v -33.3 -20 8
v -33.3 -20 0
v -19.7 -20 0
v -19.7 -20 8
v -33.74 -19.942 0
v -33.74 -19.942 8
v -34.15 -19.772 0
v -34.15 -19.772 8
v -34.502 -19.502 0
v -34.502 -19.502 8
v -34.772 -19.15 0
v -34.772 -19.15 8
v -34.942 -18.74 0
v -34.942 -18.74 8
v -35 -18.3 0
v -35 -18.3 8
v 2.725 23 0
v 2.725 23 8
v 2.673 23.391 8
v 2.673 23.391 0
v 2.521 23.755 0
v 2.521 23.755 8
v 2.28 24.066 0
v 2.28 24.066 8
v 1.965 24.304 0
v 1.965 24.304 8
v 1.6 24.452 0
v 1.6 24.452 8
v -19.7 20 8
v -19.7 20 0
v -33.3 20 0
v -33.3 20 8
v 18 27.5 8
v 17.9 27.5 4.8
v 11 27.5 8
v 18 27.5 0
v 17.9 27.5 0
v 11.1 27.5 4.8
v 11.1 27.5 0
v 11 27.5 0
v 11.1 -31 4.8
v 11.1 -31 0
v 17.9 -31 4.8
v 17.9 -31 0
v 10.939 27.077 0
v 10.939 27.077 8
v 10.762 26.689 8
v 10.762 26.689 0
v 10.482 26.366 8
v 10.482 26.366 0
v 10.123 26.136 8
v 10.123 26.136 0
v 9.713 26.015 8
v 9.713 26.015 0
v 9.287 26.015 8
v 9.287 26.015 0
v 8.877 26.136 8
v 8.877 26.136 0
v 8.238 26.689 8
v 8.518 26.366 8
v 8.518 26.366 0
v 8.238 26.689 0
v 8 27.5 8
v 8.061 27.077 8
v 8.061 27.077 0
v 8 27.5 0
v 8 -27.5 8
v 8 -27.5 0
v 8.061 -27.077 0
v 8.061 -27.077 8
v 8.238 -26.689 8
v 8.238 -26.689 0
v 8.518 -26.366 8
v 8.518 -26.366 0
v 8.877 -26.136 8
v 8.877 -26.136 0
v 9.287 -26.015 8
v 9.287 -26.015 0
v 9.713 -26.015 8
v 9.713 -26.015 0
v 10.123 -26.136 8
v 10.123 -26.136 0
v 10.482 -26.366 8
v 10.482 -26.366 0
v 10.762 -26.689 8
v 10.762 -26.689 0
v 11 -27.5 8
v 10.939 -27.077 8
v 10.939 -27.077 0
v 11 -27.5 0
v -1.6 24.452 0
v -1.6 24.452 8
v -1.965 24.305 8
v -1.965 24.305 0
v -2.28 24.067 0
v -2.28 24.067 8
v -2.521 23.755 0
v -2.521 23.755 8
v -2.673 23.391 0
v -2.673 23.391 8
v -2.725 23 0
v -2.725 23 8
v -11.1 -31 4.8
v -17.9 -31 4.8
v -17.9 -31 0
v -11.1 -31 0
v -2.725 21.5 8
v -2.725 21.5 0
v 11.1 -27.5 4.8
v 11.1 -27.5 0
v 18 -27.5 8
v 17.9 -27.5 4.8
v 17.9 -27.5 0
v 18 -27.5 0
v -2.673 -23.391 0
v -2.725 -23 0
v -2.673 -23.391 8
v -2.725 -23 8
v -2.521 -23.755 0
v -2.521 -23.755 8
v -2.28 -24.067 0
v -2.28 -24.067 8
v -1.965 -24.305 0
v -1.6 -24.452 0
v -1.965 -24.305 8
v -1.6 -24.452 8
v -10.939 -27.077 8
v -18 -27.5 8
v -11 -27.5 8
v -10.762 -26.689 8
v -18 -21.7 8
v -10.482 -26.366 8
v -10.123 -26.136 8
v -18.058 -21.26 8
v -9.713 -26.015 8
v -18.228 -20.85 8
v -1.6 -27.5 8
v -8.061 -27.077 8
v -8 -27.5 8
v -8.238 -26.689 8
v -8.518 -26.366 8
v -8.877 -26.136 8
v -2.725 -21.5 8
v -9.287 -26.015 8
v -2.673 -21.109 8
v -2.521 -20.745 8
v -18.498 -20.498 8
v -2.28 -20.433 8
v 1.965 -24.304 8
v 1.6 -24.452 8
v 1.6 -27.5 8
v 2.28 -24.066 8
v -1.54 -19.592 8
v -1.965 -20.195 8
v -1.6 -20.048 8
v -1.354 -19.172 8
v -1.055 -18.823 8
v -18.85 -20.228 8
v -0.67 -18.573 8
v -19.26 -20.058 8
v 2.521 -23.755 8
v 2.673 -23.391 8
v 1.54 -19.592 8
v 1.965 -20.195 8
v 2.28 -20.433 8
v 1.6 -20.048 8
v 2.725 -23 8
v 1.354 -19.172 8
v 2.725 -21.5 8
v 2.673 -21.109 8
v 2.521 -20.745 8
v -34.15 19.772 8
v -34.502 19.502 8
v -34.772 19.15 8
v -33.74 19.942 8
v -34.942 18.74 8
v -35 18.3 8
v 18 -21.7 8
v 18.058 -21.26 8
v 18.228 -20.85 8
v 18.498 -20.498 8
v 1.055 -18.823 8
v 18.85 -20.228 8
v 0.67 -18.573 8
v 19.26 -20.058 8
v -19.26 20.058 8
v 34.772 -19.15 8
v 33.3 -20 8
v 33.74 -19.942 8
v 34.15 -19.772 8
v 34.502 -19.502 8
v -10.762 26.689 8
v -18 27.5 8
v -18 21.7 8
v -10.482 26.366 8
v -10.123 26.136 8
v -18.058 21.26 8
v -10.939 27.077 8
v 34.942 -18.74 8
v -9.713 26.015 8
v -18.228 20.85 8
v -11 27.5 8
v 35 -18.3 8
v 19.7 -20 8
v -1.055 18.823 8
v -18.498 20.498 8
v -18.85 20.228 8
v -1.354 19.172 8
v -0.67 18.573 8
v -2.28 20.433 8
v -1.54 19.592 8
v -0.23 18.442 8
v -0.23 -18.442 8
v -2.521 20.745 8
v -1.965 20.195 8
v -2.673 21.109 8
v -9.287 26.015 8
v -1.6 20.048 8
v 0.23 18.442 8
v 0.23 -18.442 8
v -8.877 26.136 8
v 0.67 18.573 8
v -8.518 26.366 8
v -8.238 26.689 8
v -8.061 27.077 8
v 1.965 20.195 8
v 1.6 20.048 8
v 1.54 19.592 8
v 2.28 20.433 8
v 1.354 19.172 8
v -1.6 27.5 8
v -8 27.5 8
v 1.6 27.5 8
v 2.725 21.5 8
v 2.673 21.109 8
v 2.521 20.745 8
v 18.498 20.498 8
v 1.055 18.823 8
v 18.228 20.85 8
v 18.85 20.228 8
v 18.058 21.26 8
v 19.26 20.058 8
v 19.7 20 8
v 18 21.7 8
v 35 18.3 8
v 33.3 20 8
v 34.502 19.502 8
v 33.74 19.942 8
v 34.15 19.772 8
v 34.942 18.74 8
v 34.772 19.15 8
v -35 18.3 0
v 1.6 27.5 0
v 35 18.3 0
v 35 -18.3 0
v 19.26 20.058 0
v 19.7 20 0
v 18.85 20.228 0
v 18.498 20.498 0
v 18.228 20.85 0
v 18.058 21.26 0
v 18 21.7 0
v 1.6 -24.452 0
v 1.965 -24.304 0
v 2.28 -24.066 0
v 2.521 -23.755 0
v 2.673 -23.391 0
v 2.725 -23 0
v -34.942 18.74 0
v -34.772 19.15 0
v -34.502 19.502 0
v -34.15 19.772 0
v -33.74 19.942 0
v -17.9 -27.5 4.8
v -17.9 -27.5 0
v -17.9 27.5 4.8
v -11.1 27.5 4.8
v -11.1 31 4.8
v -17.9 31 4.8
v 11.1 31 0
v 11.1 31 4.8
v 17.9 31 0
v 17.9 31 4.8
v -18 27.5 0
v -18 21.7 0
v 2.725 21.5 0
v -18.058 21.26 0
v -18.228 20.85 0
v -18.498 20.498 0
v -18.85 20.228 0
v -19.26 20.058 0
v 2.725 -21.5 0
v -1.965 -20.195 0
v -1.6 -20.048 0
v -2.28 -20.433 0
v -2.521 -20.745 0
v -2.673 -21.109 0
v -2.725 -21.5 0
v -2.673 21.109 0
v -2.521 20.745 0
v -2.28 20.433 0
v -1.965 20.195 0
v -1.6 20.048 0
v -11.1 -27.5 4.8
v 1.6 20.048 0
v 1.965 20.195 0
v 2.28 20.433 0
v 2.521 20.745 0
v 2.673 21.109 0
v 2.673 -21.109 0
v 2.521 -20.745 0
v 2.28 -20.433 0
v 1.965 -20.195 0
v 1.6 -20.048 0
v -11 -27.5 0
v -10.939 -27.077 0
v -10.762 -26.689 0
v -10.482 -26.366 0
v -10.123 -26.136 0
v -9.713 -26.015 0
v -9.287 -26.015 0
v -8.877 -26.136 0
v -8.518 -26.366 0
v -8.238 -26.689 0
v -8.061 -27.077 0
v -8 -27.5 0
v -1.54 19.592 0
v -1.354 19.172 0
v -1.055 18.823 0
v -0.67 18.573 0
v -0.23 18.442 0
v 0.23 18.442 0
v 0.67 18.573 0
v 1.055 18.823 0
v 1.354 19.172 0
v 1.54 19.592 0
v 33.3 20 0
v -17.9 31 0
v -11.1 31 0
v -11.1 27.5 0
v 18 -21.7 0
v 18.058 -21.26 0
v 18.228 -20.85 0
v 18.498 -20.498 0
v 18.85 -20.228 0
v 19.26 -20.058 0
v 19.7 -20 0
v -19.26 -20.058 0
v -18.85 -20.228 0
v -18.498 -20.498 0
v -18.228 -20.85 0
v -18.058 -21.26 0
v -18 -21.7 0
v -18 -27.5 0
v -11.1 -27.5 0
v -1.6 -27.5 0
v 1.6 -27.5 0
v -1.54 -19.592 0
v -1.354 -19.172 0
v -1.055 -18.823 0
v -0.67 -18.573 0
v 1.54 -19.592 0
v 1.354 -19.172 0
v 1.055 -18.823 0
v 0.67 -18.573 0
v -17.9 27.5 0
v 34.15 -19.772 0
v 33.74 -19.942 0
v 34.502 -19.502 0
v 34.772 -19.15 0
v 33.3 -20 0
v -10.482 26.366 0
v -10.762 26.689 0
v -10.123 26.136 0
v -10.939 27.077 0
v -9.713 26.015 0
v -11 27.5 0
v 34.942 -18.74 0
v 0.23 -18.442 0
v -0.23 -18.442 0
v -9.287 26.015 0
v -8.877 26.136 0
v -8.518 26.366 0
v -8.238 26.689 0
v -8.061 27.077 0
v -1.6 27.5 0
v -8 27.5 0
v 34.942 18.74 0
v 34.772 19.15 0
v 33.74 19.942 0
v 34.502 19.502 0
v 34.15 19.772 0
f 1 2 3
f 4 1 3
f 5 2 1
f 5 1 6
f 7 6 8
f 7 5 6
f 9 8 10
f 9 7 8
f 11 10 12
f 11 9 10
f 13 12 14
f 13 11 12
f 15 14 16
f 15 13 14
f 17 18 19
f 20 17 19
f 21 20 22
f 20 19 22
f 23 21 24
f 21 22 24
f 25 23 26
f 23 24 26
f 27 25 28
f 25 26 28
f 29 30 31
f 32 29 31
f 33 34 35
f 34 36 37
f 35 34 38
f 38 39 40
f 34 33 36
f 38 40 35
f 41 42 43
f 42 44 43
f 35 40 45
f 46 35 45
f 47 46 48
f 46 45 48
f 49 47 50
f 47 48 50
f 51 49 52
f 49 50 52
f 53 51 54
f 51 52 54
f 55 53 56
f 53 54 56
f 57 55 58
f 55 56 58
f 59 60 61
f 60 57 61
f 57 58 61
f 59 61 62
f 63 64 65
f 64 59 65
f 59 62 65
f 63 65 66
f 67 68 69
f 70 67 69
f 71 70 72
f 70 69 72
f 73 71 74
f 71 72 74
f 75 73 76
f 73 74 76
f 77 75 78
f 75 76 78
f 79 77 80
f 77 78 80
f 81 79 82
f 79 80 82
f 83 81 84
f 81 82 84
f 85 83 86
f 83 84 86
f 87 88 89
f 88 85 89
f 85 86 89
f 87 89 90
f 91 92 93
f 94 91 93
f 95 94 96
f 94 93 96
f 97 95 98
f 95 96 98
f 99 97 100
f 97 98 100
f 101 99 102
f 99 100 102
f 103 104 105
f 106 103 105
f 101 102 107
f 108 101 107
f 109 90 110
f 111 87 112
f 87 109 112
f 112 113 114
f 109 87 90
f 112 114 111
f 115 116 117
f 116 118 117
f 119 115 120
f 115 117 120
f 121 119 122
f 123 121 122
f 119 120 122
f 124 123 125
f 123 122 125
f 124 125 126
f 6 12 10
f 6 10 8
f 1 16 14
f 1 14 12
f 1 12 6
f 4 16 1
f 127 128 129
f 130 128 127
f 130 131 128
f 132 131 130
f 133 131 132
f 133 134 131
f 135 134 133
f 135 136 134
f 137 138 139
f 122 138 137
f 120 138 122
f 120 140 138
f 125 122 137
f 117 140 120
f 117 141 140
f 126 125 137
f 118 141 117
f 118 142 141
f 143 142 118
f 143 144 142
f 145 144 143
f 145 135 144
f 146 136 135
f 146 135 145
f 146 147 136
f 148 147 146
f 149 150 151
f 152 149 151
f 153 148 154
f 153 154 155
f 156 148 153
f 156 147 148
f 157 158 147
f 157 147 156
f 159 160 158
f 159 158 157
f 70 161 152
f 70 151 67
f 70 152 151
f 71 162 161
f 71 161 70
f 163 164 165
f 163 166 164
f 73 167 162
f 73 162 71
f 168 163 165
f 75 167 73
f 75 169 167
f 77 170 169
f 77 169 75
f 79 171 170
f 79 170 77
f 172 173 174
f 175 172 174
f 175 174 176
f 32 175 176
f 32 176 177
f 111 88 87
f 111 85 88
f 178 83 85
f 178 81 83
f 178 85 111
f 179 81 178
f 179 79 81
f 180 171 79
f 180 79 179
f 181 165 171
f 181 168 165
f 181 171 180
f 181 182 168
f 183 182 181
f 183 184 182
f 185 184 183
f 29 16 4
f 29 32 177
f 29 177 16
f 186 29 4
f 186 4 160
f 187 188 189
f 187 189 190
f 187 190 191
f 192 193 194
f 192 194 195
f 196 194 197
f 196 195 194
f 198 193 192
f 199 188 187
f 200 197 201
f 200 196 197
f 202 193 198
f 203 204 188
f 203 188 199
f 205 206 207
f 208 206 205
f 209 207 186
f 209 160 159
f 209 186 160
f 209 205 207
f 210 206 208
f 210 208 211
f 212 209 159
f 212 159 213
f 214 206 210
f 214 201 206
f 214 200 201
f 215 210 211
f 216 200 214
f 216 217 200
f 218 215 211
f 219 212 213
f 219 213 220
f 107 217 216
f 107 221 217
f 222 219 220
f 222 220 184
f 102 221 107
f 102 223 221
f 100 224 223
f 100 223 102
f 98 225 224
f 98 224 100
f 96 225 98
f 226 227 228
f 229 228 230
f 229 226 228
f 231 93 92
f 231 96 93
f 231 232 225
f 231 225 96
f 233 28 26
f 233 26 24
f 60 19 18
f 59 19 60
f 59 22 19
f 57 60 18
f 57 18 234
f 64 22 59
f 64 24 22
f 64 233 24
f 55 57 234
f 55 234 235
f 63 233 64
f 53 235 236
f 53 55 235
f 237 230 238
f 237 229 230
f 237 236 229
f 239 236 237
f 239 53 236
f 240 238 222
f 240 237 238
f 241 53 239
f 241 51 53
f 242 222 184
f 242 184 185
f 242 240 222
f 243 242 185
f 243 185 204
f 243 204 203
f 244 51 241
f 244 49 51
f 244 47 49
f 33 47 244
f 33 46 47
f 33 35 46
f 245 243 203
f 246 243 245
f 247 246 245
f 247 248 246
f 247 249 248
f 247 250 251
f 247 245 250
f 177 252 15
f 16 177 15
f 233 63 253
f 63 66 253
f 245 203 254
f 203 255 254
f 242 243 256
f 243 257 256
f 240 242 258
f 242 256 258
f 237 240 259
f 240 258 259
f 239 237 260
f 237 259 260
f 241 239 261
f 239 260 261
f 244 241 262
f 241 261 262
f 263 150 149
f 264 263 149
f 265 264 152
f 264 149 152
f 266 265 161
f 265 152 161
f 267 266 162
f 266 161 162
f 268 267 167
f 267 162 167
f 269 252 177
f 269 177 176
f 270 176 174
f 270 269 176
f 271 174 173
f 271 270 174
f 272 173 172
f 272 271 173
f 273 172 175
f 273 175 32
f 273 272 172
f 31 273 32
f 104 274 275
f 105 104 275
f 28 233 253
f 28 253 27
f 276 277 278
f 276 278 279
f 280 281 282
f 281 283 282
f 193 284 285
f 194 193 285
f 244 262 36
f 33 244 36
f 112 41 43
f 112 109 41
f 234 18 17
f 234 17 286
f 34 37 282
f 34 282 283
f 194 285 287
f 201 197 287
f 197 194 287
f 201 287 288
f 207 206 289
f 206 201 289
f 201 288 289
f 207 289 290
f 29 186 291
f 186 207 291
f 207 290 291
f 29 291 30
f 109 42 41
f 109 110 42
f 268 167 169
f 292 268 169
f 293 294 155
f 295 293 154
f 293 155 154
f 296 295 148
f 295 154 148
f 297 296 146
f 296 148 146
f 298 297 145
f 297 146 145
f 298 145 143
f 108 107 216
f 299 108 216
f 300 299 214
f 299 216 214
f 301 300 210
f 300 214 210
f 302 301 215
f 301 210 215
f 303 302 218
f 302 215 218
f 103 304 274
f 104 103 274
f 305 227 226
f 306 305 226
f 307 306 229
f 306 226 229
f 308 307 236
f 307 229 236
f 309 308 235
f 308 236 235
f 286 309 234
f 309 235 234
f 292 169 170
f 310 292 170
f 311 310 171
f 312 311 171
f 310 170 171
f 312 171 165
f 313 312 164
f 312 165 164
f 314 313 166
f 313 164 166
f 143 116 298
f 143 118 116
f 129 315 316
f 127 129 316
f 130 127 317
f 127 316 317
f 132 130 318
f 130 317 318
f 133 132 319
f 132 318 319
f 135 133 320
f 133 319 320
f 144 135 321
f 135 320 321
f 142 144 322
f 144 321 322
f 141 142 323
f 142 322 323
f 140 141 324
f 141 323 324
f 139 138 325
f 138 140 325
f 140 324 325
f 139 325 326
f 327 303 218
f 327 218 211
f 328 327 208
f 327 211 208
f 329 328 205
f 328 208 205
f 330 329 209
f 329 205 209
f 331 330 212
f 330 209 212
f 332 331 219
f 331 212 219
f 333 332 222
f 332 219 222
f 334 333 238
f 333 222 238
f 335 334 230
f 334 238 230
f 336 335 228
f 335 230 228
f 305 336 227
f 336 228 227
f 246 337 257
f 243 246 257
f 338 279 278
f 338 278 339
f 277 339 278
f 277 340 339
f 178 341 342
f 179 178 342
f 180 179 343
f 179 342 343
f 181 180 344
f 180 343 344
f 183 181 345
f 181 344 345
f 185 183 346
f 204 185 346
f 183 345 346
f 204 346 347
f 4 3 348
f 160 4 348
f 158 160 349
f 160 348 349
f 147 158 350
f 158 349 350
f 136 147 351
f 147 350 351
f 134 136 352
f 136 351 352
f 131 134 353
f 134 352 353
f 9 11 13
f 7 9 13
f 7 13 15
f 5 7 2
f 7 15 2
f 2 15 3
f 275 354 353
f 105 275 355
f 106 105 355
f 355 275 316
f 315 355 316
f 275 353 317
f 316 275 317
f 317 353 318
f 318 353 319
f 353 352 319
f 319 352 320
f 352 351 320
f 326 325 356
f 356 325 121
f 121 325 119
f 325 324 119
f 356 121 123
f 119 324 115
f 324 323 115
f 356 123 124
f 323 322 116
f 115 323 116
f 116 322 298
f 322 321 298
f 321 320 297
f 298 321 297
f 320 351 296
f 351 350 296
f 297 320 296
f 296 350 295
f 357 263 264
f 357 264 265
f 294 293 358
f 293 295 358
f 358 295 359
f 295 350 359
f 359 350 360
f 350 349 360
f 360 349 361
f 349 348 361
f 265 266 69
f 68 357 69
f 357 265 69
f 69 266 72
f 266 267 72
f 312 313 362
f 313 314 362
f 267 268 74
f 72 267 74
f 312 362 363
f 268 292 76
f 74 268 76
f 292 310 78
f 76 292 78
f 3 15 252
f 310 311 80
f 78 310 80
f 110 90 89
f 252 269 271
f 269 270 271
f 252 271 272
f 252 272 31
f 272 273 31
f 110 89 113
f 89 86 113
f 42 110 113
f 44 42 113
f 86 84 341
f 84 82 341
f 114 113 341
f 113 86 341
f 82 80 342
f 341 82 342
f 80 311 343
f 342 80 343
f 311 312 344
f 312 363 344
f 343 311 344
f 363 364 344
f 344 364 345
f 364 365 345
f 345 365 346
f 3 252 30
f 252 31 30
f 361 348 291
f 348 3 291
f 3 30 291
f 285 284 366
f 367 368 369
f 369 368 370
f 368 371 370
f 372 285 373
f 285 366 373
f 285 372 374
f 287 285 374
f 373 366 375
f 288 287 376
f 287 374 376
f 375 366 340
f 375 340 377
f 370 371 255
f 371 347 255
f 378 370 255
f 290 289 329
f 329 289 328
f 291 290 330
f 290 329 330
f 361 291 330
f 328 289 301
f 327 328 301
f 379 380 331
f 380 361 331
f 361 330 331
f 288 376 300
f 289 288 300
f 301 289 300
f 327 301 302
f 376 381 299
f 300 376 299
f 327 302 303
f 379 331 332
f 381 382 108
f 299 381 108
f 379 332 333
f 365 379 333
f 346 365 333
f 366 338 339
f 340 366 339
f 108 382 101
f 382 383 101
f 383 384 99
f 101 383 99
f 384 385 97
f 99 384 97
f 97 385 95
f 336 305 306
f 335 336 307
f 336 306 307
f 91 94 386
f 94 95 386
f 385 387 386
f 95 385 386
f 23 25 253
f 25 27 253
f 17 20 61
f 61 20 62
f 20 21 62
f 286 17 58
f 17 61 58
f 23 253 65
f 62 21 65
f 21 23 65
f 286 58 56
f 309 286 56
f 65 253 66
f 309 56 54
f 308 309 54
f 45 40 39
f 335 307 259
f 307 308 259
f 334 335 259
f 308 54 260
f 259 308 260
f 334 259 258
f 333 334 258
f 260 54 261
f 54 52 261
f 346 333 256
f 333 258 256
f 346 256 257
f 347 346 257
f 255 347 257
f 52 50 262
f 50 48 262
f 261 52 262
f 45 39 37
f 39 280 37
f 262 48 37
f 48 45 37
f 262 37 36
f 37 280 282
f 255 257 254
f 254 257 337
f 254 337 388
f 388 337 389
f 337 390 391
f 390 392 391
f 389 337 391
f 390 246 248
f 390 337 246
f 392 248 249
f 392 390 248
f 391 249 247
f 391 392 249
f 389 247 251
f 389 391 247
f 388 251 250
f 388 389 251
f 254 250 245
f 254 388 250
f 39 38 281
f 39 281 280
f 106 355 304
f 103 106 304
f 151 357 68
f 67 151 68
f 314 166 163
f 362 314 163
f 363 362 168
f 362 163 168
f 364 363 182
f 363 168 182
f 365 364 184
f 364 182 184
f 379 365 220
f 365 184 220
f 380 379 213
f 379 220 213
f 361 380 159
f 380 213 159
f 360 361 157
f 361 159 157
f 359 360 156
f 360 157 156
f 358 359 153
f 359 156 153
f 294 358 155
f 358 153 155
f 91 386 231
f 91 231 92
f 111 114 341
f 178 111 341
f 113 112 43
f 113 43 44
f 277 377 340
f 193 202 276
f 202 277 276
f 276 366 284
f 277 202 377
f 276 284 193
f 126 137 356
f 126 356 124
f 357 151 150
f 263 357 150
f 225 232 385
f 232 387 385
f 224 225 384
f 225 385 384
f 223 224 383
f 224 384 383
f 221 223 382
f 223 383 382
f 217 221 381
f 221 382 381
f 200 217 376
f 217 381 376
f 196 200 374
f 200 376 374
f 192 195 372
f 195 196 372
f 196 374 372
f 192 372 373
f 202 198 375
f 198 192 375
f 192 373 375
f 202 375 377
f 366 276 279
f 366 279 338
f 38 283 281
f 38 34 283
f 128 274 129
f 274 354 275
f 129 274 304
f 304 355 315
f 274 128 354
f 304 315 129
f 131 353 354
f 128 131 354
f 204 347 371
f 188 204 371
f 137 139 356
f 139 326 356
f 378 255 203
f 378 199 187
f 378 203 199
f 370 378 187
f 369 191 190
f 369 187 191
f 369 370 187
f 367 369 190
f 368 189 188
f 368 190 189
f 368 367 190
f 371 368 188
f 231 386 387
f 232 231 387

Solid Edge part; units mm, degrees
sketch "Sketch1" plane through (0, 0, 0) normal (0, 0, 1) x (1, 0, 0)
  line L0 (-18, -27.5) -> (18, -27.5)
  line L1 (18, -27.5) -> (18, -21.7)
  arc A0 (18, -21.7) -> (19.7, -20) centre (19.7, -21.7) cw
  line L2 (19.7, -20) -> (33.3, -20)
  arc A1 (33.3, -20) -> (35, -18.3) centre (33.3, -18.3) ccw
  line L3 (35, -18.3) -> (35, 18.3)
  arc A2 (33.3, 20) -> (35, 18.3) centre (33.3, 18.3) cw
  line L4 (33.3, 20) -> (19.7, 20)
  arc A3 (18, 21.7) -> (19.7, 20) centre (19.7, 21.7) ccw
  line L5 (18, 21.7) -> (18, 27.5)
  line L6 (18, 27.5) -> (-18, 27.5)
  line L7 (-18, 27.5) -> (-18, 21.7)
  arc A4 (-19.7, 20) -> (-18, 21.7) centre (-19.7, 21.7) ccw
  line L8 (-19.7, 20) -> (-33.3, 20)
  arc A5 (-35, 18.3) -> (-33.3, 20) centre (-33.3, 18.3) cw
  line L9 (-35, 18.3) -> (-35, -18.3)
  arc A6 (-35, -18.3) -> (-33.3, -20) centre (-33.3, -18.3) ccw
  line L10 (-33.3, -20) -> (-19.7, -20)
  arc A7 (-19.7, -20) -> (-18, -21.7) centre (-19.7, -21.7) cw
  line L11 (-18, -21.7) -> (-18, -27.5)
extrude "Protrusion1" add sketch "Sketch1" along normal blind 8
sketch "Sketch2" plane through (0, -27.5, 4) normal (0, -1, 0) x (1, 0, 0)
  line L0 (-11.1, 0.8) -> (-17.9, 0.8)
  line L1 (-17.9, 0.8) -> (-17.9, -4)
  line L2 (-17.9, -4) -> (-11.1, -4)
  line L3 (-11.1, -4) -> (-11.1, 0.8)
  line L4 (11.1, 0.8) -> (17.9, 0.8)
  line L5 (17.9, 0.8) -> (17.9, -4)
  line L6 (17.9, -4) -> (11.1, -4)
  line L7 (11.1, -4) -> (11.1, 0.8)
extrude "ExtrudedProtrusion_2" add sketch "Sketch2" along normal blind 3.5
sketch "Sketch3" plane through (0, 27.5, 4) normal (0, 1, 0) x (-1, 0, 0)
  line L0 (-17.9, 0.8) -> (-11.1, 0.8)
  line L1 (-11.1, 0.8) -> (-11.1, -4)
  line L2 (-11.1, -4) -> (-17.9, -4)
  line L3 (-17.9, -4) -> (-17.9, 0.8)
extrude "ExtrudedProtrusion_3" add sketch "Sketch3" along normal blind 3.5
sketch "Sketch4" plane through (0, 0, 0) normal (0, 0, -1) x (0, 1, 0)
  arc A0 (-27.5, -8) -> (-27.5, -11) centre (-27.5, -9.5) cw
  line L0 (-27.5, -8) -> (-27.5, -11)
  arc A1 (-27.5, 11) -> (-27.5, 8) centre (-27.5, 9.5) cw
  line L1 (-27.5, 8) -> (-27.5, 11)
  arc A2 (27.5, -11) -> (27.5, -8) centre (27.5, -9.5) cw
  line L2 (27.5, -8) -> (27.5, -11)
  arc A3 (27.5, 8) -> (27.5, 11) centre (27.5, 9.5) cw
  line L3 (27.5, 8) -> (27.5, 11)
extrude "ExtrudedCutout_2" cut sketch "Sketch4" against normal blind 8
sketch "Sketch5" plane through (0, 27.5, 4) normal (0, 1, 0) x (-1, 0, 0)
  line L0 (11.1, 0.8) -> (17.9, 0.8)
  line L1 (17.9, 0.8) -> (17.9, -4)
  line L2 (17.9, -4) -> (11.1, -4)
  line L3 (11.1, -4) -> (11.1, 0.8)
extrude "ExtrudedProtrusion_4" add sketch "Sketch5" along normal blind 3.5
sketch "Sketch6" plane through (0, 0, 8) normal (0, 0, 1) x (-1, 0, 0)
  arc A0 (-1.5998, 20.0476) -> (1.5998, 20.0476) centre (0, 20.0254) ccw
  arc A1 (2.725, 21.5) -> (1.5998, 20.0476) centre (1.225, 21.5) cw
  line L0 (2.725, 23) -> (2.725, 21.5)
  arc A2 (1.5998, 24.4524) -> (2.725, 23) centre (1.225, 23) cw
  line L1 (1.5998, 27.5) -> (1.5998, 24.4524)
  line L2 (0, 27.5) -> (1.5998, 27.5)
  line L3 (0, 27.5) -> (-1.6, 27.5)
  line L4 (-1.6, 27.5) -> (-1.6, 24.4524)
  arc A3 (-1.6, 24.4524) -> (-2.725, 23) centre (-1.225, 23) ccw
  line L5 (-2.725, 23) -> (-2.725, 21.5)
  arc A4 (-2.725, 21.5) -> (-1.5998, 20.0476) centre (-1.225, 21.5) ccw
  arc A5 (-1.5998, -20.0476) -> (1.5998, -20.0476) centre (0, -20.0254) cw
  arc A6 (2.725, -21.5) -> (1.5998, -20.0476) centre (1.225, -21.5) ccw
  line L6 (2.725, -23) -> (2.725, -21.5)
  arc A7 (1.5998, -24.4524) -> (2.725, -23) centre (1.225, -23) ccw
  line L7 (1.5998, -27.5) -> (1.5998, -24.4524)
  line L8 (0, -27.5) -> (1.5998, -27.5)
  line L9 (0, -27.5) -> (-1.6, -27.5)
  line L10 (-1.6, -27.5) -> (-1.6, -24.4524)
  arc A8 (-1.6, -24.4524) -> (-2.725, -23) centre (-1.225, -23) cw
  line L11 (-2.725, -23) -> (-2.725, -21.5)
  arc A9 (-2.725, -21.5) -> (-1.5998, -20.0476) centre (-1.225, -21.5) cw
extrude "Cutout1" cut sketch "Sketch6" against normal up to next
properties material "Polycarbonate"
